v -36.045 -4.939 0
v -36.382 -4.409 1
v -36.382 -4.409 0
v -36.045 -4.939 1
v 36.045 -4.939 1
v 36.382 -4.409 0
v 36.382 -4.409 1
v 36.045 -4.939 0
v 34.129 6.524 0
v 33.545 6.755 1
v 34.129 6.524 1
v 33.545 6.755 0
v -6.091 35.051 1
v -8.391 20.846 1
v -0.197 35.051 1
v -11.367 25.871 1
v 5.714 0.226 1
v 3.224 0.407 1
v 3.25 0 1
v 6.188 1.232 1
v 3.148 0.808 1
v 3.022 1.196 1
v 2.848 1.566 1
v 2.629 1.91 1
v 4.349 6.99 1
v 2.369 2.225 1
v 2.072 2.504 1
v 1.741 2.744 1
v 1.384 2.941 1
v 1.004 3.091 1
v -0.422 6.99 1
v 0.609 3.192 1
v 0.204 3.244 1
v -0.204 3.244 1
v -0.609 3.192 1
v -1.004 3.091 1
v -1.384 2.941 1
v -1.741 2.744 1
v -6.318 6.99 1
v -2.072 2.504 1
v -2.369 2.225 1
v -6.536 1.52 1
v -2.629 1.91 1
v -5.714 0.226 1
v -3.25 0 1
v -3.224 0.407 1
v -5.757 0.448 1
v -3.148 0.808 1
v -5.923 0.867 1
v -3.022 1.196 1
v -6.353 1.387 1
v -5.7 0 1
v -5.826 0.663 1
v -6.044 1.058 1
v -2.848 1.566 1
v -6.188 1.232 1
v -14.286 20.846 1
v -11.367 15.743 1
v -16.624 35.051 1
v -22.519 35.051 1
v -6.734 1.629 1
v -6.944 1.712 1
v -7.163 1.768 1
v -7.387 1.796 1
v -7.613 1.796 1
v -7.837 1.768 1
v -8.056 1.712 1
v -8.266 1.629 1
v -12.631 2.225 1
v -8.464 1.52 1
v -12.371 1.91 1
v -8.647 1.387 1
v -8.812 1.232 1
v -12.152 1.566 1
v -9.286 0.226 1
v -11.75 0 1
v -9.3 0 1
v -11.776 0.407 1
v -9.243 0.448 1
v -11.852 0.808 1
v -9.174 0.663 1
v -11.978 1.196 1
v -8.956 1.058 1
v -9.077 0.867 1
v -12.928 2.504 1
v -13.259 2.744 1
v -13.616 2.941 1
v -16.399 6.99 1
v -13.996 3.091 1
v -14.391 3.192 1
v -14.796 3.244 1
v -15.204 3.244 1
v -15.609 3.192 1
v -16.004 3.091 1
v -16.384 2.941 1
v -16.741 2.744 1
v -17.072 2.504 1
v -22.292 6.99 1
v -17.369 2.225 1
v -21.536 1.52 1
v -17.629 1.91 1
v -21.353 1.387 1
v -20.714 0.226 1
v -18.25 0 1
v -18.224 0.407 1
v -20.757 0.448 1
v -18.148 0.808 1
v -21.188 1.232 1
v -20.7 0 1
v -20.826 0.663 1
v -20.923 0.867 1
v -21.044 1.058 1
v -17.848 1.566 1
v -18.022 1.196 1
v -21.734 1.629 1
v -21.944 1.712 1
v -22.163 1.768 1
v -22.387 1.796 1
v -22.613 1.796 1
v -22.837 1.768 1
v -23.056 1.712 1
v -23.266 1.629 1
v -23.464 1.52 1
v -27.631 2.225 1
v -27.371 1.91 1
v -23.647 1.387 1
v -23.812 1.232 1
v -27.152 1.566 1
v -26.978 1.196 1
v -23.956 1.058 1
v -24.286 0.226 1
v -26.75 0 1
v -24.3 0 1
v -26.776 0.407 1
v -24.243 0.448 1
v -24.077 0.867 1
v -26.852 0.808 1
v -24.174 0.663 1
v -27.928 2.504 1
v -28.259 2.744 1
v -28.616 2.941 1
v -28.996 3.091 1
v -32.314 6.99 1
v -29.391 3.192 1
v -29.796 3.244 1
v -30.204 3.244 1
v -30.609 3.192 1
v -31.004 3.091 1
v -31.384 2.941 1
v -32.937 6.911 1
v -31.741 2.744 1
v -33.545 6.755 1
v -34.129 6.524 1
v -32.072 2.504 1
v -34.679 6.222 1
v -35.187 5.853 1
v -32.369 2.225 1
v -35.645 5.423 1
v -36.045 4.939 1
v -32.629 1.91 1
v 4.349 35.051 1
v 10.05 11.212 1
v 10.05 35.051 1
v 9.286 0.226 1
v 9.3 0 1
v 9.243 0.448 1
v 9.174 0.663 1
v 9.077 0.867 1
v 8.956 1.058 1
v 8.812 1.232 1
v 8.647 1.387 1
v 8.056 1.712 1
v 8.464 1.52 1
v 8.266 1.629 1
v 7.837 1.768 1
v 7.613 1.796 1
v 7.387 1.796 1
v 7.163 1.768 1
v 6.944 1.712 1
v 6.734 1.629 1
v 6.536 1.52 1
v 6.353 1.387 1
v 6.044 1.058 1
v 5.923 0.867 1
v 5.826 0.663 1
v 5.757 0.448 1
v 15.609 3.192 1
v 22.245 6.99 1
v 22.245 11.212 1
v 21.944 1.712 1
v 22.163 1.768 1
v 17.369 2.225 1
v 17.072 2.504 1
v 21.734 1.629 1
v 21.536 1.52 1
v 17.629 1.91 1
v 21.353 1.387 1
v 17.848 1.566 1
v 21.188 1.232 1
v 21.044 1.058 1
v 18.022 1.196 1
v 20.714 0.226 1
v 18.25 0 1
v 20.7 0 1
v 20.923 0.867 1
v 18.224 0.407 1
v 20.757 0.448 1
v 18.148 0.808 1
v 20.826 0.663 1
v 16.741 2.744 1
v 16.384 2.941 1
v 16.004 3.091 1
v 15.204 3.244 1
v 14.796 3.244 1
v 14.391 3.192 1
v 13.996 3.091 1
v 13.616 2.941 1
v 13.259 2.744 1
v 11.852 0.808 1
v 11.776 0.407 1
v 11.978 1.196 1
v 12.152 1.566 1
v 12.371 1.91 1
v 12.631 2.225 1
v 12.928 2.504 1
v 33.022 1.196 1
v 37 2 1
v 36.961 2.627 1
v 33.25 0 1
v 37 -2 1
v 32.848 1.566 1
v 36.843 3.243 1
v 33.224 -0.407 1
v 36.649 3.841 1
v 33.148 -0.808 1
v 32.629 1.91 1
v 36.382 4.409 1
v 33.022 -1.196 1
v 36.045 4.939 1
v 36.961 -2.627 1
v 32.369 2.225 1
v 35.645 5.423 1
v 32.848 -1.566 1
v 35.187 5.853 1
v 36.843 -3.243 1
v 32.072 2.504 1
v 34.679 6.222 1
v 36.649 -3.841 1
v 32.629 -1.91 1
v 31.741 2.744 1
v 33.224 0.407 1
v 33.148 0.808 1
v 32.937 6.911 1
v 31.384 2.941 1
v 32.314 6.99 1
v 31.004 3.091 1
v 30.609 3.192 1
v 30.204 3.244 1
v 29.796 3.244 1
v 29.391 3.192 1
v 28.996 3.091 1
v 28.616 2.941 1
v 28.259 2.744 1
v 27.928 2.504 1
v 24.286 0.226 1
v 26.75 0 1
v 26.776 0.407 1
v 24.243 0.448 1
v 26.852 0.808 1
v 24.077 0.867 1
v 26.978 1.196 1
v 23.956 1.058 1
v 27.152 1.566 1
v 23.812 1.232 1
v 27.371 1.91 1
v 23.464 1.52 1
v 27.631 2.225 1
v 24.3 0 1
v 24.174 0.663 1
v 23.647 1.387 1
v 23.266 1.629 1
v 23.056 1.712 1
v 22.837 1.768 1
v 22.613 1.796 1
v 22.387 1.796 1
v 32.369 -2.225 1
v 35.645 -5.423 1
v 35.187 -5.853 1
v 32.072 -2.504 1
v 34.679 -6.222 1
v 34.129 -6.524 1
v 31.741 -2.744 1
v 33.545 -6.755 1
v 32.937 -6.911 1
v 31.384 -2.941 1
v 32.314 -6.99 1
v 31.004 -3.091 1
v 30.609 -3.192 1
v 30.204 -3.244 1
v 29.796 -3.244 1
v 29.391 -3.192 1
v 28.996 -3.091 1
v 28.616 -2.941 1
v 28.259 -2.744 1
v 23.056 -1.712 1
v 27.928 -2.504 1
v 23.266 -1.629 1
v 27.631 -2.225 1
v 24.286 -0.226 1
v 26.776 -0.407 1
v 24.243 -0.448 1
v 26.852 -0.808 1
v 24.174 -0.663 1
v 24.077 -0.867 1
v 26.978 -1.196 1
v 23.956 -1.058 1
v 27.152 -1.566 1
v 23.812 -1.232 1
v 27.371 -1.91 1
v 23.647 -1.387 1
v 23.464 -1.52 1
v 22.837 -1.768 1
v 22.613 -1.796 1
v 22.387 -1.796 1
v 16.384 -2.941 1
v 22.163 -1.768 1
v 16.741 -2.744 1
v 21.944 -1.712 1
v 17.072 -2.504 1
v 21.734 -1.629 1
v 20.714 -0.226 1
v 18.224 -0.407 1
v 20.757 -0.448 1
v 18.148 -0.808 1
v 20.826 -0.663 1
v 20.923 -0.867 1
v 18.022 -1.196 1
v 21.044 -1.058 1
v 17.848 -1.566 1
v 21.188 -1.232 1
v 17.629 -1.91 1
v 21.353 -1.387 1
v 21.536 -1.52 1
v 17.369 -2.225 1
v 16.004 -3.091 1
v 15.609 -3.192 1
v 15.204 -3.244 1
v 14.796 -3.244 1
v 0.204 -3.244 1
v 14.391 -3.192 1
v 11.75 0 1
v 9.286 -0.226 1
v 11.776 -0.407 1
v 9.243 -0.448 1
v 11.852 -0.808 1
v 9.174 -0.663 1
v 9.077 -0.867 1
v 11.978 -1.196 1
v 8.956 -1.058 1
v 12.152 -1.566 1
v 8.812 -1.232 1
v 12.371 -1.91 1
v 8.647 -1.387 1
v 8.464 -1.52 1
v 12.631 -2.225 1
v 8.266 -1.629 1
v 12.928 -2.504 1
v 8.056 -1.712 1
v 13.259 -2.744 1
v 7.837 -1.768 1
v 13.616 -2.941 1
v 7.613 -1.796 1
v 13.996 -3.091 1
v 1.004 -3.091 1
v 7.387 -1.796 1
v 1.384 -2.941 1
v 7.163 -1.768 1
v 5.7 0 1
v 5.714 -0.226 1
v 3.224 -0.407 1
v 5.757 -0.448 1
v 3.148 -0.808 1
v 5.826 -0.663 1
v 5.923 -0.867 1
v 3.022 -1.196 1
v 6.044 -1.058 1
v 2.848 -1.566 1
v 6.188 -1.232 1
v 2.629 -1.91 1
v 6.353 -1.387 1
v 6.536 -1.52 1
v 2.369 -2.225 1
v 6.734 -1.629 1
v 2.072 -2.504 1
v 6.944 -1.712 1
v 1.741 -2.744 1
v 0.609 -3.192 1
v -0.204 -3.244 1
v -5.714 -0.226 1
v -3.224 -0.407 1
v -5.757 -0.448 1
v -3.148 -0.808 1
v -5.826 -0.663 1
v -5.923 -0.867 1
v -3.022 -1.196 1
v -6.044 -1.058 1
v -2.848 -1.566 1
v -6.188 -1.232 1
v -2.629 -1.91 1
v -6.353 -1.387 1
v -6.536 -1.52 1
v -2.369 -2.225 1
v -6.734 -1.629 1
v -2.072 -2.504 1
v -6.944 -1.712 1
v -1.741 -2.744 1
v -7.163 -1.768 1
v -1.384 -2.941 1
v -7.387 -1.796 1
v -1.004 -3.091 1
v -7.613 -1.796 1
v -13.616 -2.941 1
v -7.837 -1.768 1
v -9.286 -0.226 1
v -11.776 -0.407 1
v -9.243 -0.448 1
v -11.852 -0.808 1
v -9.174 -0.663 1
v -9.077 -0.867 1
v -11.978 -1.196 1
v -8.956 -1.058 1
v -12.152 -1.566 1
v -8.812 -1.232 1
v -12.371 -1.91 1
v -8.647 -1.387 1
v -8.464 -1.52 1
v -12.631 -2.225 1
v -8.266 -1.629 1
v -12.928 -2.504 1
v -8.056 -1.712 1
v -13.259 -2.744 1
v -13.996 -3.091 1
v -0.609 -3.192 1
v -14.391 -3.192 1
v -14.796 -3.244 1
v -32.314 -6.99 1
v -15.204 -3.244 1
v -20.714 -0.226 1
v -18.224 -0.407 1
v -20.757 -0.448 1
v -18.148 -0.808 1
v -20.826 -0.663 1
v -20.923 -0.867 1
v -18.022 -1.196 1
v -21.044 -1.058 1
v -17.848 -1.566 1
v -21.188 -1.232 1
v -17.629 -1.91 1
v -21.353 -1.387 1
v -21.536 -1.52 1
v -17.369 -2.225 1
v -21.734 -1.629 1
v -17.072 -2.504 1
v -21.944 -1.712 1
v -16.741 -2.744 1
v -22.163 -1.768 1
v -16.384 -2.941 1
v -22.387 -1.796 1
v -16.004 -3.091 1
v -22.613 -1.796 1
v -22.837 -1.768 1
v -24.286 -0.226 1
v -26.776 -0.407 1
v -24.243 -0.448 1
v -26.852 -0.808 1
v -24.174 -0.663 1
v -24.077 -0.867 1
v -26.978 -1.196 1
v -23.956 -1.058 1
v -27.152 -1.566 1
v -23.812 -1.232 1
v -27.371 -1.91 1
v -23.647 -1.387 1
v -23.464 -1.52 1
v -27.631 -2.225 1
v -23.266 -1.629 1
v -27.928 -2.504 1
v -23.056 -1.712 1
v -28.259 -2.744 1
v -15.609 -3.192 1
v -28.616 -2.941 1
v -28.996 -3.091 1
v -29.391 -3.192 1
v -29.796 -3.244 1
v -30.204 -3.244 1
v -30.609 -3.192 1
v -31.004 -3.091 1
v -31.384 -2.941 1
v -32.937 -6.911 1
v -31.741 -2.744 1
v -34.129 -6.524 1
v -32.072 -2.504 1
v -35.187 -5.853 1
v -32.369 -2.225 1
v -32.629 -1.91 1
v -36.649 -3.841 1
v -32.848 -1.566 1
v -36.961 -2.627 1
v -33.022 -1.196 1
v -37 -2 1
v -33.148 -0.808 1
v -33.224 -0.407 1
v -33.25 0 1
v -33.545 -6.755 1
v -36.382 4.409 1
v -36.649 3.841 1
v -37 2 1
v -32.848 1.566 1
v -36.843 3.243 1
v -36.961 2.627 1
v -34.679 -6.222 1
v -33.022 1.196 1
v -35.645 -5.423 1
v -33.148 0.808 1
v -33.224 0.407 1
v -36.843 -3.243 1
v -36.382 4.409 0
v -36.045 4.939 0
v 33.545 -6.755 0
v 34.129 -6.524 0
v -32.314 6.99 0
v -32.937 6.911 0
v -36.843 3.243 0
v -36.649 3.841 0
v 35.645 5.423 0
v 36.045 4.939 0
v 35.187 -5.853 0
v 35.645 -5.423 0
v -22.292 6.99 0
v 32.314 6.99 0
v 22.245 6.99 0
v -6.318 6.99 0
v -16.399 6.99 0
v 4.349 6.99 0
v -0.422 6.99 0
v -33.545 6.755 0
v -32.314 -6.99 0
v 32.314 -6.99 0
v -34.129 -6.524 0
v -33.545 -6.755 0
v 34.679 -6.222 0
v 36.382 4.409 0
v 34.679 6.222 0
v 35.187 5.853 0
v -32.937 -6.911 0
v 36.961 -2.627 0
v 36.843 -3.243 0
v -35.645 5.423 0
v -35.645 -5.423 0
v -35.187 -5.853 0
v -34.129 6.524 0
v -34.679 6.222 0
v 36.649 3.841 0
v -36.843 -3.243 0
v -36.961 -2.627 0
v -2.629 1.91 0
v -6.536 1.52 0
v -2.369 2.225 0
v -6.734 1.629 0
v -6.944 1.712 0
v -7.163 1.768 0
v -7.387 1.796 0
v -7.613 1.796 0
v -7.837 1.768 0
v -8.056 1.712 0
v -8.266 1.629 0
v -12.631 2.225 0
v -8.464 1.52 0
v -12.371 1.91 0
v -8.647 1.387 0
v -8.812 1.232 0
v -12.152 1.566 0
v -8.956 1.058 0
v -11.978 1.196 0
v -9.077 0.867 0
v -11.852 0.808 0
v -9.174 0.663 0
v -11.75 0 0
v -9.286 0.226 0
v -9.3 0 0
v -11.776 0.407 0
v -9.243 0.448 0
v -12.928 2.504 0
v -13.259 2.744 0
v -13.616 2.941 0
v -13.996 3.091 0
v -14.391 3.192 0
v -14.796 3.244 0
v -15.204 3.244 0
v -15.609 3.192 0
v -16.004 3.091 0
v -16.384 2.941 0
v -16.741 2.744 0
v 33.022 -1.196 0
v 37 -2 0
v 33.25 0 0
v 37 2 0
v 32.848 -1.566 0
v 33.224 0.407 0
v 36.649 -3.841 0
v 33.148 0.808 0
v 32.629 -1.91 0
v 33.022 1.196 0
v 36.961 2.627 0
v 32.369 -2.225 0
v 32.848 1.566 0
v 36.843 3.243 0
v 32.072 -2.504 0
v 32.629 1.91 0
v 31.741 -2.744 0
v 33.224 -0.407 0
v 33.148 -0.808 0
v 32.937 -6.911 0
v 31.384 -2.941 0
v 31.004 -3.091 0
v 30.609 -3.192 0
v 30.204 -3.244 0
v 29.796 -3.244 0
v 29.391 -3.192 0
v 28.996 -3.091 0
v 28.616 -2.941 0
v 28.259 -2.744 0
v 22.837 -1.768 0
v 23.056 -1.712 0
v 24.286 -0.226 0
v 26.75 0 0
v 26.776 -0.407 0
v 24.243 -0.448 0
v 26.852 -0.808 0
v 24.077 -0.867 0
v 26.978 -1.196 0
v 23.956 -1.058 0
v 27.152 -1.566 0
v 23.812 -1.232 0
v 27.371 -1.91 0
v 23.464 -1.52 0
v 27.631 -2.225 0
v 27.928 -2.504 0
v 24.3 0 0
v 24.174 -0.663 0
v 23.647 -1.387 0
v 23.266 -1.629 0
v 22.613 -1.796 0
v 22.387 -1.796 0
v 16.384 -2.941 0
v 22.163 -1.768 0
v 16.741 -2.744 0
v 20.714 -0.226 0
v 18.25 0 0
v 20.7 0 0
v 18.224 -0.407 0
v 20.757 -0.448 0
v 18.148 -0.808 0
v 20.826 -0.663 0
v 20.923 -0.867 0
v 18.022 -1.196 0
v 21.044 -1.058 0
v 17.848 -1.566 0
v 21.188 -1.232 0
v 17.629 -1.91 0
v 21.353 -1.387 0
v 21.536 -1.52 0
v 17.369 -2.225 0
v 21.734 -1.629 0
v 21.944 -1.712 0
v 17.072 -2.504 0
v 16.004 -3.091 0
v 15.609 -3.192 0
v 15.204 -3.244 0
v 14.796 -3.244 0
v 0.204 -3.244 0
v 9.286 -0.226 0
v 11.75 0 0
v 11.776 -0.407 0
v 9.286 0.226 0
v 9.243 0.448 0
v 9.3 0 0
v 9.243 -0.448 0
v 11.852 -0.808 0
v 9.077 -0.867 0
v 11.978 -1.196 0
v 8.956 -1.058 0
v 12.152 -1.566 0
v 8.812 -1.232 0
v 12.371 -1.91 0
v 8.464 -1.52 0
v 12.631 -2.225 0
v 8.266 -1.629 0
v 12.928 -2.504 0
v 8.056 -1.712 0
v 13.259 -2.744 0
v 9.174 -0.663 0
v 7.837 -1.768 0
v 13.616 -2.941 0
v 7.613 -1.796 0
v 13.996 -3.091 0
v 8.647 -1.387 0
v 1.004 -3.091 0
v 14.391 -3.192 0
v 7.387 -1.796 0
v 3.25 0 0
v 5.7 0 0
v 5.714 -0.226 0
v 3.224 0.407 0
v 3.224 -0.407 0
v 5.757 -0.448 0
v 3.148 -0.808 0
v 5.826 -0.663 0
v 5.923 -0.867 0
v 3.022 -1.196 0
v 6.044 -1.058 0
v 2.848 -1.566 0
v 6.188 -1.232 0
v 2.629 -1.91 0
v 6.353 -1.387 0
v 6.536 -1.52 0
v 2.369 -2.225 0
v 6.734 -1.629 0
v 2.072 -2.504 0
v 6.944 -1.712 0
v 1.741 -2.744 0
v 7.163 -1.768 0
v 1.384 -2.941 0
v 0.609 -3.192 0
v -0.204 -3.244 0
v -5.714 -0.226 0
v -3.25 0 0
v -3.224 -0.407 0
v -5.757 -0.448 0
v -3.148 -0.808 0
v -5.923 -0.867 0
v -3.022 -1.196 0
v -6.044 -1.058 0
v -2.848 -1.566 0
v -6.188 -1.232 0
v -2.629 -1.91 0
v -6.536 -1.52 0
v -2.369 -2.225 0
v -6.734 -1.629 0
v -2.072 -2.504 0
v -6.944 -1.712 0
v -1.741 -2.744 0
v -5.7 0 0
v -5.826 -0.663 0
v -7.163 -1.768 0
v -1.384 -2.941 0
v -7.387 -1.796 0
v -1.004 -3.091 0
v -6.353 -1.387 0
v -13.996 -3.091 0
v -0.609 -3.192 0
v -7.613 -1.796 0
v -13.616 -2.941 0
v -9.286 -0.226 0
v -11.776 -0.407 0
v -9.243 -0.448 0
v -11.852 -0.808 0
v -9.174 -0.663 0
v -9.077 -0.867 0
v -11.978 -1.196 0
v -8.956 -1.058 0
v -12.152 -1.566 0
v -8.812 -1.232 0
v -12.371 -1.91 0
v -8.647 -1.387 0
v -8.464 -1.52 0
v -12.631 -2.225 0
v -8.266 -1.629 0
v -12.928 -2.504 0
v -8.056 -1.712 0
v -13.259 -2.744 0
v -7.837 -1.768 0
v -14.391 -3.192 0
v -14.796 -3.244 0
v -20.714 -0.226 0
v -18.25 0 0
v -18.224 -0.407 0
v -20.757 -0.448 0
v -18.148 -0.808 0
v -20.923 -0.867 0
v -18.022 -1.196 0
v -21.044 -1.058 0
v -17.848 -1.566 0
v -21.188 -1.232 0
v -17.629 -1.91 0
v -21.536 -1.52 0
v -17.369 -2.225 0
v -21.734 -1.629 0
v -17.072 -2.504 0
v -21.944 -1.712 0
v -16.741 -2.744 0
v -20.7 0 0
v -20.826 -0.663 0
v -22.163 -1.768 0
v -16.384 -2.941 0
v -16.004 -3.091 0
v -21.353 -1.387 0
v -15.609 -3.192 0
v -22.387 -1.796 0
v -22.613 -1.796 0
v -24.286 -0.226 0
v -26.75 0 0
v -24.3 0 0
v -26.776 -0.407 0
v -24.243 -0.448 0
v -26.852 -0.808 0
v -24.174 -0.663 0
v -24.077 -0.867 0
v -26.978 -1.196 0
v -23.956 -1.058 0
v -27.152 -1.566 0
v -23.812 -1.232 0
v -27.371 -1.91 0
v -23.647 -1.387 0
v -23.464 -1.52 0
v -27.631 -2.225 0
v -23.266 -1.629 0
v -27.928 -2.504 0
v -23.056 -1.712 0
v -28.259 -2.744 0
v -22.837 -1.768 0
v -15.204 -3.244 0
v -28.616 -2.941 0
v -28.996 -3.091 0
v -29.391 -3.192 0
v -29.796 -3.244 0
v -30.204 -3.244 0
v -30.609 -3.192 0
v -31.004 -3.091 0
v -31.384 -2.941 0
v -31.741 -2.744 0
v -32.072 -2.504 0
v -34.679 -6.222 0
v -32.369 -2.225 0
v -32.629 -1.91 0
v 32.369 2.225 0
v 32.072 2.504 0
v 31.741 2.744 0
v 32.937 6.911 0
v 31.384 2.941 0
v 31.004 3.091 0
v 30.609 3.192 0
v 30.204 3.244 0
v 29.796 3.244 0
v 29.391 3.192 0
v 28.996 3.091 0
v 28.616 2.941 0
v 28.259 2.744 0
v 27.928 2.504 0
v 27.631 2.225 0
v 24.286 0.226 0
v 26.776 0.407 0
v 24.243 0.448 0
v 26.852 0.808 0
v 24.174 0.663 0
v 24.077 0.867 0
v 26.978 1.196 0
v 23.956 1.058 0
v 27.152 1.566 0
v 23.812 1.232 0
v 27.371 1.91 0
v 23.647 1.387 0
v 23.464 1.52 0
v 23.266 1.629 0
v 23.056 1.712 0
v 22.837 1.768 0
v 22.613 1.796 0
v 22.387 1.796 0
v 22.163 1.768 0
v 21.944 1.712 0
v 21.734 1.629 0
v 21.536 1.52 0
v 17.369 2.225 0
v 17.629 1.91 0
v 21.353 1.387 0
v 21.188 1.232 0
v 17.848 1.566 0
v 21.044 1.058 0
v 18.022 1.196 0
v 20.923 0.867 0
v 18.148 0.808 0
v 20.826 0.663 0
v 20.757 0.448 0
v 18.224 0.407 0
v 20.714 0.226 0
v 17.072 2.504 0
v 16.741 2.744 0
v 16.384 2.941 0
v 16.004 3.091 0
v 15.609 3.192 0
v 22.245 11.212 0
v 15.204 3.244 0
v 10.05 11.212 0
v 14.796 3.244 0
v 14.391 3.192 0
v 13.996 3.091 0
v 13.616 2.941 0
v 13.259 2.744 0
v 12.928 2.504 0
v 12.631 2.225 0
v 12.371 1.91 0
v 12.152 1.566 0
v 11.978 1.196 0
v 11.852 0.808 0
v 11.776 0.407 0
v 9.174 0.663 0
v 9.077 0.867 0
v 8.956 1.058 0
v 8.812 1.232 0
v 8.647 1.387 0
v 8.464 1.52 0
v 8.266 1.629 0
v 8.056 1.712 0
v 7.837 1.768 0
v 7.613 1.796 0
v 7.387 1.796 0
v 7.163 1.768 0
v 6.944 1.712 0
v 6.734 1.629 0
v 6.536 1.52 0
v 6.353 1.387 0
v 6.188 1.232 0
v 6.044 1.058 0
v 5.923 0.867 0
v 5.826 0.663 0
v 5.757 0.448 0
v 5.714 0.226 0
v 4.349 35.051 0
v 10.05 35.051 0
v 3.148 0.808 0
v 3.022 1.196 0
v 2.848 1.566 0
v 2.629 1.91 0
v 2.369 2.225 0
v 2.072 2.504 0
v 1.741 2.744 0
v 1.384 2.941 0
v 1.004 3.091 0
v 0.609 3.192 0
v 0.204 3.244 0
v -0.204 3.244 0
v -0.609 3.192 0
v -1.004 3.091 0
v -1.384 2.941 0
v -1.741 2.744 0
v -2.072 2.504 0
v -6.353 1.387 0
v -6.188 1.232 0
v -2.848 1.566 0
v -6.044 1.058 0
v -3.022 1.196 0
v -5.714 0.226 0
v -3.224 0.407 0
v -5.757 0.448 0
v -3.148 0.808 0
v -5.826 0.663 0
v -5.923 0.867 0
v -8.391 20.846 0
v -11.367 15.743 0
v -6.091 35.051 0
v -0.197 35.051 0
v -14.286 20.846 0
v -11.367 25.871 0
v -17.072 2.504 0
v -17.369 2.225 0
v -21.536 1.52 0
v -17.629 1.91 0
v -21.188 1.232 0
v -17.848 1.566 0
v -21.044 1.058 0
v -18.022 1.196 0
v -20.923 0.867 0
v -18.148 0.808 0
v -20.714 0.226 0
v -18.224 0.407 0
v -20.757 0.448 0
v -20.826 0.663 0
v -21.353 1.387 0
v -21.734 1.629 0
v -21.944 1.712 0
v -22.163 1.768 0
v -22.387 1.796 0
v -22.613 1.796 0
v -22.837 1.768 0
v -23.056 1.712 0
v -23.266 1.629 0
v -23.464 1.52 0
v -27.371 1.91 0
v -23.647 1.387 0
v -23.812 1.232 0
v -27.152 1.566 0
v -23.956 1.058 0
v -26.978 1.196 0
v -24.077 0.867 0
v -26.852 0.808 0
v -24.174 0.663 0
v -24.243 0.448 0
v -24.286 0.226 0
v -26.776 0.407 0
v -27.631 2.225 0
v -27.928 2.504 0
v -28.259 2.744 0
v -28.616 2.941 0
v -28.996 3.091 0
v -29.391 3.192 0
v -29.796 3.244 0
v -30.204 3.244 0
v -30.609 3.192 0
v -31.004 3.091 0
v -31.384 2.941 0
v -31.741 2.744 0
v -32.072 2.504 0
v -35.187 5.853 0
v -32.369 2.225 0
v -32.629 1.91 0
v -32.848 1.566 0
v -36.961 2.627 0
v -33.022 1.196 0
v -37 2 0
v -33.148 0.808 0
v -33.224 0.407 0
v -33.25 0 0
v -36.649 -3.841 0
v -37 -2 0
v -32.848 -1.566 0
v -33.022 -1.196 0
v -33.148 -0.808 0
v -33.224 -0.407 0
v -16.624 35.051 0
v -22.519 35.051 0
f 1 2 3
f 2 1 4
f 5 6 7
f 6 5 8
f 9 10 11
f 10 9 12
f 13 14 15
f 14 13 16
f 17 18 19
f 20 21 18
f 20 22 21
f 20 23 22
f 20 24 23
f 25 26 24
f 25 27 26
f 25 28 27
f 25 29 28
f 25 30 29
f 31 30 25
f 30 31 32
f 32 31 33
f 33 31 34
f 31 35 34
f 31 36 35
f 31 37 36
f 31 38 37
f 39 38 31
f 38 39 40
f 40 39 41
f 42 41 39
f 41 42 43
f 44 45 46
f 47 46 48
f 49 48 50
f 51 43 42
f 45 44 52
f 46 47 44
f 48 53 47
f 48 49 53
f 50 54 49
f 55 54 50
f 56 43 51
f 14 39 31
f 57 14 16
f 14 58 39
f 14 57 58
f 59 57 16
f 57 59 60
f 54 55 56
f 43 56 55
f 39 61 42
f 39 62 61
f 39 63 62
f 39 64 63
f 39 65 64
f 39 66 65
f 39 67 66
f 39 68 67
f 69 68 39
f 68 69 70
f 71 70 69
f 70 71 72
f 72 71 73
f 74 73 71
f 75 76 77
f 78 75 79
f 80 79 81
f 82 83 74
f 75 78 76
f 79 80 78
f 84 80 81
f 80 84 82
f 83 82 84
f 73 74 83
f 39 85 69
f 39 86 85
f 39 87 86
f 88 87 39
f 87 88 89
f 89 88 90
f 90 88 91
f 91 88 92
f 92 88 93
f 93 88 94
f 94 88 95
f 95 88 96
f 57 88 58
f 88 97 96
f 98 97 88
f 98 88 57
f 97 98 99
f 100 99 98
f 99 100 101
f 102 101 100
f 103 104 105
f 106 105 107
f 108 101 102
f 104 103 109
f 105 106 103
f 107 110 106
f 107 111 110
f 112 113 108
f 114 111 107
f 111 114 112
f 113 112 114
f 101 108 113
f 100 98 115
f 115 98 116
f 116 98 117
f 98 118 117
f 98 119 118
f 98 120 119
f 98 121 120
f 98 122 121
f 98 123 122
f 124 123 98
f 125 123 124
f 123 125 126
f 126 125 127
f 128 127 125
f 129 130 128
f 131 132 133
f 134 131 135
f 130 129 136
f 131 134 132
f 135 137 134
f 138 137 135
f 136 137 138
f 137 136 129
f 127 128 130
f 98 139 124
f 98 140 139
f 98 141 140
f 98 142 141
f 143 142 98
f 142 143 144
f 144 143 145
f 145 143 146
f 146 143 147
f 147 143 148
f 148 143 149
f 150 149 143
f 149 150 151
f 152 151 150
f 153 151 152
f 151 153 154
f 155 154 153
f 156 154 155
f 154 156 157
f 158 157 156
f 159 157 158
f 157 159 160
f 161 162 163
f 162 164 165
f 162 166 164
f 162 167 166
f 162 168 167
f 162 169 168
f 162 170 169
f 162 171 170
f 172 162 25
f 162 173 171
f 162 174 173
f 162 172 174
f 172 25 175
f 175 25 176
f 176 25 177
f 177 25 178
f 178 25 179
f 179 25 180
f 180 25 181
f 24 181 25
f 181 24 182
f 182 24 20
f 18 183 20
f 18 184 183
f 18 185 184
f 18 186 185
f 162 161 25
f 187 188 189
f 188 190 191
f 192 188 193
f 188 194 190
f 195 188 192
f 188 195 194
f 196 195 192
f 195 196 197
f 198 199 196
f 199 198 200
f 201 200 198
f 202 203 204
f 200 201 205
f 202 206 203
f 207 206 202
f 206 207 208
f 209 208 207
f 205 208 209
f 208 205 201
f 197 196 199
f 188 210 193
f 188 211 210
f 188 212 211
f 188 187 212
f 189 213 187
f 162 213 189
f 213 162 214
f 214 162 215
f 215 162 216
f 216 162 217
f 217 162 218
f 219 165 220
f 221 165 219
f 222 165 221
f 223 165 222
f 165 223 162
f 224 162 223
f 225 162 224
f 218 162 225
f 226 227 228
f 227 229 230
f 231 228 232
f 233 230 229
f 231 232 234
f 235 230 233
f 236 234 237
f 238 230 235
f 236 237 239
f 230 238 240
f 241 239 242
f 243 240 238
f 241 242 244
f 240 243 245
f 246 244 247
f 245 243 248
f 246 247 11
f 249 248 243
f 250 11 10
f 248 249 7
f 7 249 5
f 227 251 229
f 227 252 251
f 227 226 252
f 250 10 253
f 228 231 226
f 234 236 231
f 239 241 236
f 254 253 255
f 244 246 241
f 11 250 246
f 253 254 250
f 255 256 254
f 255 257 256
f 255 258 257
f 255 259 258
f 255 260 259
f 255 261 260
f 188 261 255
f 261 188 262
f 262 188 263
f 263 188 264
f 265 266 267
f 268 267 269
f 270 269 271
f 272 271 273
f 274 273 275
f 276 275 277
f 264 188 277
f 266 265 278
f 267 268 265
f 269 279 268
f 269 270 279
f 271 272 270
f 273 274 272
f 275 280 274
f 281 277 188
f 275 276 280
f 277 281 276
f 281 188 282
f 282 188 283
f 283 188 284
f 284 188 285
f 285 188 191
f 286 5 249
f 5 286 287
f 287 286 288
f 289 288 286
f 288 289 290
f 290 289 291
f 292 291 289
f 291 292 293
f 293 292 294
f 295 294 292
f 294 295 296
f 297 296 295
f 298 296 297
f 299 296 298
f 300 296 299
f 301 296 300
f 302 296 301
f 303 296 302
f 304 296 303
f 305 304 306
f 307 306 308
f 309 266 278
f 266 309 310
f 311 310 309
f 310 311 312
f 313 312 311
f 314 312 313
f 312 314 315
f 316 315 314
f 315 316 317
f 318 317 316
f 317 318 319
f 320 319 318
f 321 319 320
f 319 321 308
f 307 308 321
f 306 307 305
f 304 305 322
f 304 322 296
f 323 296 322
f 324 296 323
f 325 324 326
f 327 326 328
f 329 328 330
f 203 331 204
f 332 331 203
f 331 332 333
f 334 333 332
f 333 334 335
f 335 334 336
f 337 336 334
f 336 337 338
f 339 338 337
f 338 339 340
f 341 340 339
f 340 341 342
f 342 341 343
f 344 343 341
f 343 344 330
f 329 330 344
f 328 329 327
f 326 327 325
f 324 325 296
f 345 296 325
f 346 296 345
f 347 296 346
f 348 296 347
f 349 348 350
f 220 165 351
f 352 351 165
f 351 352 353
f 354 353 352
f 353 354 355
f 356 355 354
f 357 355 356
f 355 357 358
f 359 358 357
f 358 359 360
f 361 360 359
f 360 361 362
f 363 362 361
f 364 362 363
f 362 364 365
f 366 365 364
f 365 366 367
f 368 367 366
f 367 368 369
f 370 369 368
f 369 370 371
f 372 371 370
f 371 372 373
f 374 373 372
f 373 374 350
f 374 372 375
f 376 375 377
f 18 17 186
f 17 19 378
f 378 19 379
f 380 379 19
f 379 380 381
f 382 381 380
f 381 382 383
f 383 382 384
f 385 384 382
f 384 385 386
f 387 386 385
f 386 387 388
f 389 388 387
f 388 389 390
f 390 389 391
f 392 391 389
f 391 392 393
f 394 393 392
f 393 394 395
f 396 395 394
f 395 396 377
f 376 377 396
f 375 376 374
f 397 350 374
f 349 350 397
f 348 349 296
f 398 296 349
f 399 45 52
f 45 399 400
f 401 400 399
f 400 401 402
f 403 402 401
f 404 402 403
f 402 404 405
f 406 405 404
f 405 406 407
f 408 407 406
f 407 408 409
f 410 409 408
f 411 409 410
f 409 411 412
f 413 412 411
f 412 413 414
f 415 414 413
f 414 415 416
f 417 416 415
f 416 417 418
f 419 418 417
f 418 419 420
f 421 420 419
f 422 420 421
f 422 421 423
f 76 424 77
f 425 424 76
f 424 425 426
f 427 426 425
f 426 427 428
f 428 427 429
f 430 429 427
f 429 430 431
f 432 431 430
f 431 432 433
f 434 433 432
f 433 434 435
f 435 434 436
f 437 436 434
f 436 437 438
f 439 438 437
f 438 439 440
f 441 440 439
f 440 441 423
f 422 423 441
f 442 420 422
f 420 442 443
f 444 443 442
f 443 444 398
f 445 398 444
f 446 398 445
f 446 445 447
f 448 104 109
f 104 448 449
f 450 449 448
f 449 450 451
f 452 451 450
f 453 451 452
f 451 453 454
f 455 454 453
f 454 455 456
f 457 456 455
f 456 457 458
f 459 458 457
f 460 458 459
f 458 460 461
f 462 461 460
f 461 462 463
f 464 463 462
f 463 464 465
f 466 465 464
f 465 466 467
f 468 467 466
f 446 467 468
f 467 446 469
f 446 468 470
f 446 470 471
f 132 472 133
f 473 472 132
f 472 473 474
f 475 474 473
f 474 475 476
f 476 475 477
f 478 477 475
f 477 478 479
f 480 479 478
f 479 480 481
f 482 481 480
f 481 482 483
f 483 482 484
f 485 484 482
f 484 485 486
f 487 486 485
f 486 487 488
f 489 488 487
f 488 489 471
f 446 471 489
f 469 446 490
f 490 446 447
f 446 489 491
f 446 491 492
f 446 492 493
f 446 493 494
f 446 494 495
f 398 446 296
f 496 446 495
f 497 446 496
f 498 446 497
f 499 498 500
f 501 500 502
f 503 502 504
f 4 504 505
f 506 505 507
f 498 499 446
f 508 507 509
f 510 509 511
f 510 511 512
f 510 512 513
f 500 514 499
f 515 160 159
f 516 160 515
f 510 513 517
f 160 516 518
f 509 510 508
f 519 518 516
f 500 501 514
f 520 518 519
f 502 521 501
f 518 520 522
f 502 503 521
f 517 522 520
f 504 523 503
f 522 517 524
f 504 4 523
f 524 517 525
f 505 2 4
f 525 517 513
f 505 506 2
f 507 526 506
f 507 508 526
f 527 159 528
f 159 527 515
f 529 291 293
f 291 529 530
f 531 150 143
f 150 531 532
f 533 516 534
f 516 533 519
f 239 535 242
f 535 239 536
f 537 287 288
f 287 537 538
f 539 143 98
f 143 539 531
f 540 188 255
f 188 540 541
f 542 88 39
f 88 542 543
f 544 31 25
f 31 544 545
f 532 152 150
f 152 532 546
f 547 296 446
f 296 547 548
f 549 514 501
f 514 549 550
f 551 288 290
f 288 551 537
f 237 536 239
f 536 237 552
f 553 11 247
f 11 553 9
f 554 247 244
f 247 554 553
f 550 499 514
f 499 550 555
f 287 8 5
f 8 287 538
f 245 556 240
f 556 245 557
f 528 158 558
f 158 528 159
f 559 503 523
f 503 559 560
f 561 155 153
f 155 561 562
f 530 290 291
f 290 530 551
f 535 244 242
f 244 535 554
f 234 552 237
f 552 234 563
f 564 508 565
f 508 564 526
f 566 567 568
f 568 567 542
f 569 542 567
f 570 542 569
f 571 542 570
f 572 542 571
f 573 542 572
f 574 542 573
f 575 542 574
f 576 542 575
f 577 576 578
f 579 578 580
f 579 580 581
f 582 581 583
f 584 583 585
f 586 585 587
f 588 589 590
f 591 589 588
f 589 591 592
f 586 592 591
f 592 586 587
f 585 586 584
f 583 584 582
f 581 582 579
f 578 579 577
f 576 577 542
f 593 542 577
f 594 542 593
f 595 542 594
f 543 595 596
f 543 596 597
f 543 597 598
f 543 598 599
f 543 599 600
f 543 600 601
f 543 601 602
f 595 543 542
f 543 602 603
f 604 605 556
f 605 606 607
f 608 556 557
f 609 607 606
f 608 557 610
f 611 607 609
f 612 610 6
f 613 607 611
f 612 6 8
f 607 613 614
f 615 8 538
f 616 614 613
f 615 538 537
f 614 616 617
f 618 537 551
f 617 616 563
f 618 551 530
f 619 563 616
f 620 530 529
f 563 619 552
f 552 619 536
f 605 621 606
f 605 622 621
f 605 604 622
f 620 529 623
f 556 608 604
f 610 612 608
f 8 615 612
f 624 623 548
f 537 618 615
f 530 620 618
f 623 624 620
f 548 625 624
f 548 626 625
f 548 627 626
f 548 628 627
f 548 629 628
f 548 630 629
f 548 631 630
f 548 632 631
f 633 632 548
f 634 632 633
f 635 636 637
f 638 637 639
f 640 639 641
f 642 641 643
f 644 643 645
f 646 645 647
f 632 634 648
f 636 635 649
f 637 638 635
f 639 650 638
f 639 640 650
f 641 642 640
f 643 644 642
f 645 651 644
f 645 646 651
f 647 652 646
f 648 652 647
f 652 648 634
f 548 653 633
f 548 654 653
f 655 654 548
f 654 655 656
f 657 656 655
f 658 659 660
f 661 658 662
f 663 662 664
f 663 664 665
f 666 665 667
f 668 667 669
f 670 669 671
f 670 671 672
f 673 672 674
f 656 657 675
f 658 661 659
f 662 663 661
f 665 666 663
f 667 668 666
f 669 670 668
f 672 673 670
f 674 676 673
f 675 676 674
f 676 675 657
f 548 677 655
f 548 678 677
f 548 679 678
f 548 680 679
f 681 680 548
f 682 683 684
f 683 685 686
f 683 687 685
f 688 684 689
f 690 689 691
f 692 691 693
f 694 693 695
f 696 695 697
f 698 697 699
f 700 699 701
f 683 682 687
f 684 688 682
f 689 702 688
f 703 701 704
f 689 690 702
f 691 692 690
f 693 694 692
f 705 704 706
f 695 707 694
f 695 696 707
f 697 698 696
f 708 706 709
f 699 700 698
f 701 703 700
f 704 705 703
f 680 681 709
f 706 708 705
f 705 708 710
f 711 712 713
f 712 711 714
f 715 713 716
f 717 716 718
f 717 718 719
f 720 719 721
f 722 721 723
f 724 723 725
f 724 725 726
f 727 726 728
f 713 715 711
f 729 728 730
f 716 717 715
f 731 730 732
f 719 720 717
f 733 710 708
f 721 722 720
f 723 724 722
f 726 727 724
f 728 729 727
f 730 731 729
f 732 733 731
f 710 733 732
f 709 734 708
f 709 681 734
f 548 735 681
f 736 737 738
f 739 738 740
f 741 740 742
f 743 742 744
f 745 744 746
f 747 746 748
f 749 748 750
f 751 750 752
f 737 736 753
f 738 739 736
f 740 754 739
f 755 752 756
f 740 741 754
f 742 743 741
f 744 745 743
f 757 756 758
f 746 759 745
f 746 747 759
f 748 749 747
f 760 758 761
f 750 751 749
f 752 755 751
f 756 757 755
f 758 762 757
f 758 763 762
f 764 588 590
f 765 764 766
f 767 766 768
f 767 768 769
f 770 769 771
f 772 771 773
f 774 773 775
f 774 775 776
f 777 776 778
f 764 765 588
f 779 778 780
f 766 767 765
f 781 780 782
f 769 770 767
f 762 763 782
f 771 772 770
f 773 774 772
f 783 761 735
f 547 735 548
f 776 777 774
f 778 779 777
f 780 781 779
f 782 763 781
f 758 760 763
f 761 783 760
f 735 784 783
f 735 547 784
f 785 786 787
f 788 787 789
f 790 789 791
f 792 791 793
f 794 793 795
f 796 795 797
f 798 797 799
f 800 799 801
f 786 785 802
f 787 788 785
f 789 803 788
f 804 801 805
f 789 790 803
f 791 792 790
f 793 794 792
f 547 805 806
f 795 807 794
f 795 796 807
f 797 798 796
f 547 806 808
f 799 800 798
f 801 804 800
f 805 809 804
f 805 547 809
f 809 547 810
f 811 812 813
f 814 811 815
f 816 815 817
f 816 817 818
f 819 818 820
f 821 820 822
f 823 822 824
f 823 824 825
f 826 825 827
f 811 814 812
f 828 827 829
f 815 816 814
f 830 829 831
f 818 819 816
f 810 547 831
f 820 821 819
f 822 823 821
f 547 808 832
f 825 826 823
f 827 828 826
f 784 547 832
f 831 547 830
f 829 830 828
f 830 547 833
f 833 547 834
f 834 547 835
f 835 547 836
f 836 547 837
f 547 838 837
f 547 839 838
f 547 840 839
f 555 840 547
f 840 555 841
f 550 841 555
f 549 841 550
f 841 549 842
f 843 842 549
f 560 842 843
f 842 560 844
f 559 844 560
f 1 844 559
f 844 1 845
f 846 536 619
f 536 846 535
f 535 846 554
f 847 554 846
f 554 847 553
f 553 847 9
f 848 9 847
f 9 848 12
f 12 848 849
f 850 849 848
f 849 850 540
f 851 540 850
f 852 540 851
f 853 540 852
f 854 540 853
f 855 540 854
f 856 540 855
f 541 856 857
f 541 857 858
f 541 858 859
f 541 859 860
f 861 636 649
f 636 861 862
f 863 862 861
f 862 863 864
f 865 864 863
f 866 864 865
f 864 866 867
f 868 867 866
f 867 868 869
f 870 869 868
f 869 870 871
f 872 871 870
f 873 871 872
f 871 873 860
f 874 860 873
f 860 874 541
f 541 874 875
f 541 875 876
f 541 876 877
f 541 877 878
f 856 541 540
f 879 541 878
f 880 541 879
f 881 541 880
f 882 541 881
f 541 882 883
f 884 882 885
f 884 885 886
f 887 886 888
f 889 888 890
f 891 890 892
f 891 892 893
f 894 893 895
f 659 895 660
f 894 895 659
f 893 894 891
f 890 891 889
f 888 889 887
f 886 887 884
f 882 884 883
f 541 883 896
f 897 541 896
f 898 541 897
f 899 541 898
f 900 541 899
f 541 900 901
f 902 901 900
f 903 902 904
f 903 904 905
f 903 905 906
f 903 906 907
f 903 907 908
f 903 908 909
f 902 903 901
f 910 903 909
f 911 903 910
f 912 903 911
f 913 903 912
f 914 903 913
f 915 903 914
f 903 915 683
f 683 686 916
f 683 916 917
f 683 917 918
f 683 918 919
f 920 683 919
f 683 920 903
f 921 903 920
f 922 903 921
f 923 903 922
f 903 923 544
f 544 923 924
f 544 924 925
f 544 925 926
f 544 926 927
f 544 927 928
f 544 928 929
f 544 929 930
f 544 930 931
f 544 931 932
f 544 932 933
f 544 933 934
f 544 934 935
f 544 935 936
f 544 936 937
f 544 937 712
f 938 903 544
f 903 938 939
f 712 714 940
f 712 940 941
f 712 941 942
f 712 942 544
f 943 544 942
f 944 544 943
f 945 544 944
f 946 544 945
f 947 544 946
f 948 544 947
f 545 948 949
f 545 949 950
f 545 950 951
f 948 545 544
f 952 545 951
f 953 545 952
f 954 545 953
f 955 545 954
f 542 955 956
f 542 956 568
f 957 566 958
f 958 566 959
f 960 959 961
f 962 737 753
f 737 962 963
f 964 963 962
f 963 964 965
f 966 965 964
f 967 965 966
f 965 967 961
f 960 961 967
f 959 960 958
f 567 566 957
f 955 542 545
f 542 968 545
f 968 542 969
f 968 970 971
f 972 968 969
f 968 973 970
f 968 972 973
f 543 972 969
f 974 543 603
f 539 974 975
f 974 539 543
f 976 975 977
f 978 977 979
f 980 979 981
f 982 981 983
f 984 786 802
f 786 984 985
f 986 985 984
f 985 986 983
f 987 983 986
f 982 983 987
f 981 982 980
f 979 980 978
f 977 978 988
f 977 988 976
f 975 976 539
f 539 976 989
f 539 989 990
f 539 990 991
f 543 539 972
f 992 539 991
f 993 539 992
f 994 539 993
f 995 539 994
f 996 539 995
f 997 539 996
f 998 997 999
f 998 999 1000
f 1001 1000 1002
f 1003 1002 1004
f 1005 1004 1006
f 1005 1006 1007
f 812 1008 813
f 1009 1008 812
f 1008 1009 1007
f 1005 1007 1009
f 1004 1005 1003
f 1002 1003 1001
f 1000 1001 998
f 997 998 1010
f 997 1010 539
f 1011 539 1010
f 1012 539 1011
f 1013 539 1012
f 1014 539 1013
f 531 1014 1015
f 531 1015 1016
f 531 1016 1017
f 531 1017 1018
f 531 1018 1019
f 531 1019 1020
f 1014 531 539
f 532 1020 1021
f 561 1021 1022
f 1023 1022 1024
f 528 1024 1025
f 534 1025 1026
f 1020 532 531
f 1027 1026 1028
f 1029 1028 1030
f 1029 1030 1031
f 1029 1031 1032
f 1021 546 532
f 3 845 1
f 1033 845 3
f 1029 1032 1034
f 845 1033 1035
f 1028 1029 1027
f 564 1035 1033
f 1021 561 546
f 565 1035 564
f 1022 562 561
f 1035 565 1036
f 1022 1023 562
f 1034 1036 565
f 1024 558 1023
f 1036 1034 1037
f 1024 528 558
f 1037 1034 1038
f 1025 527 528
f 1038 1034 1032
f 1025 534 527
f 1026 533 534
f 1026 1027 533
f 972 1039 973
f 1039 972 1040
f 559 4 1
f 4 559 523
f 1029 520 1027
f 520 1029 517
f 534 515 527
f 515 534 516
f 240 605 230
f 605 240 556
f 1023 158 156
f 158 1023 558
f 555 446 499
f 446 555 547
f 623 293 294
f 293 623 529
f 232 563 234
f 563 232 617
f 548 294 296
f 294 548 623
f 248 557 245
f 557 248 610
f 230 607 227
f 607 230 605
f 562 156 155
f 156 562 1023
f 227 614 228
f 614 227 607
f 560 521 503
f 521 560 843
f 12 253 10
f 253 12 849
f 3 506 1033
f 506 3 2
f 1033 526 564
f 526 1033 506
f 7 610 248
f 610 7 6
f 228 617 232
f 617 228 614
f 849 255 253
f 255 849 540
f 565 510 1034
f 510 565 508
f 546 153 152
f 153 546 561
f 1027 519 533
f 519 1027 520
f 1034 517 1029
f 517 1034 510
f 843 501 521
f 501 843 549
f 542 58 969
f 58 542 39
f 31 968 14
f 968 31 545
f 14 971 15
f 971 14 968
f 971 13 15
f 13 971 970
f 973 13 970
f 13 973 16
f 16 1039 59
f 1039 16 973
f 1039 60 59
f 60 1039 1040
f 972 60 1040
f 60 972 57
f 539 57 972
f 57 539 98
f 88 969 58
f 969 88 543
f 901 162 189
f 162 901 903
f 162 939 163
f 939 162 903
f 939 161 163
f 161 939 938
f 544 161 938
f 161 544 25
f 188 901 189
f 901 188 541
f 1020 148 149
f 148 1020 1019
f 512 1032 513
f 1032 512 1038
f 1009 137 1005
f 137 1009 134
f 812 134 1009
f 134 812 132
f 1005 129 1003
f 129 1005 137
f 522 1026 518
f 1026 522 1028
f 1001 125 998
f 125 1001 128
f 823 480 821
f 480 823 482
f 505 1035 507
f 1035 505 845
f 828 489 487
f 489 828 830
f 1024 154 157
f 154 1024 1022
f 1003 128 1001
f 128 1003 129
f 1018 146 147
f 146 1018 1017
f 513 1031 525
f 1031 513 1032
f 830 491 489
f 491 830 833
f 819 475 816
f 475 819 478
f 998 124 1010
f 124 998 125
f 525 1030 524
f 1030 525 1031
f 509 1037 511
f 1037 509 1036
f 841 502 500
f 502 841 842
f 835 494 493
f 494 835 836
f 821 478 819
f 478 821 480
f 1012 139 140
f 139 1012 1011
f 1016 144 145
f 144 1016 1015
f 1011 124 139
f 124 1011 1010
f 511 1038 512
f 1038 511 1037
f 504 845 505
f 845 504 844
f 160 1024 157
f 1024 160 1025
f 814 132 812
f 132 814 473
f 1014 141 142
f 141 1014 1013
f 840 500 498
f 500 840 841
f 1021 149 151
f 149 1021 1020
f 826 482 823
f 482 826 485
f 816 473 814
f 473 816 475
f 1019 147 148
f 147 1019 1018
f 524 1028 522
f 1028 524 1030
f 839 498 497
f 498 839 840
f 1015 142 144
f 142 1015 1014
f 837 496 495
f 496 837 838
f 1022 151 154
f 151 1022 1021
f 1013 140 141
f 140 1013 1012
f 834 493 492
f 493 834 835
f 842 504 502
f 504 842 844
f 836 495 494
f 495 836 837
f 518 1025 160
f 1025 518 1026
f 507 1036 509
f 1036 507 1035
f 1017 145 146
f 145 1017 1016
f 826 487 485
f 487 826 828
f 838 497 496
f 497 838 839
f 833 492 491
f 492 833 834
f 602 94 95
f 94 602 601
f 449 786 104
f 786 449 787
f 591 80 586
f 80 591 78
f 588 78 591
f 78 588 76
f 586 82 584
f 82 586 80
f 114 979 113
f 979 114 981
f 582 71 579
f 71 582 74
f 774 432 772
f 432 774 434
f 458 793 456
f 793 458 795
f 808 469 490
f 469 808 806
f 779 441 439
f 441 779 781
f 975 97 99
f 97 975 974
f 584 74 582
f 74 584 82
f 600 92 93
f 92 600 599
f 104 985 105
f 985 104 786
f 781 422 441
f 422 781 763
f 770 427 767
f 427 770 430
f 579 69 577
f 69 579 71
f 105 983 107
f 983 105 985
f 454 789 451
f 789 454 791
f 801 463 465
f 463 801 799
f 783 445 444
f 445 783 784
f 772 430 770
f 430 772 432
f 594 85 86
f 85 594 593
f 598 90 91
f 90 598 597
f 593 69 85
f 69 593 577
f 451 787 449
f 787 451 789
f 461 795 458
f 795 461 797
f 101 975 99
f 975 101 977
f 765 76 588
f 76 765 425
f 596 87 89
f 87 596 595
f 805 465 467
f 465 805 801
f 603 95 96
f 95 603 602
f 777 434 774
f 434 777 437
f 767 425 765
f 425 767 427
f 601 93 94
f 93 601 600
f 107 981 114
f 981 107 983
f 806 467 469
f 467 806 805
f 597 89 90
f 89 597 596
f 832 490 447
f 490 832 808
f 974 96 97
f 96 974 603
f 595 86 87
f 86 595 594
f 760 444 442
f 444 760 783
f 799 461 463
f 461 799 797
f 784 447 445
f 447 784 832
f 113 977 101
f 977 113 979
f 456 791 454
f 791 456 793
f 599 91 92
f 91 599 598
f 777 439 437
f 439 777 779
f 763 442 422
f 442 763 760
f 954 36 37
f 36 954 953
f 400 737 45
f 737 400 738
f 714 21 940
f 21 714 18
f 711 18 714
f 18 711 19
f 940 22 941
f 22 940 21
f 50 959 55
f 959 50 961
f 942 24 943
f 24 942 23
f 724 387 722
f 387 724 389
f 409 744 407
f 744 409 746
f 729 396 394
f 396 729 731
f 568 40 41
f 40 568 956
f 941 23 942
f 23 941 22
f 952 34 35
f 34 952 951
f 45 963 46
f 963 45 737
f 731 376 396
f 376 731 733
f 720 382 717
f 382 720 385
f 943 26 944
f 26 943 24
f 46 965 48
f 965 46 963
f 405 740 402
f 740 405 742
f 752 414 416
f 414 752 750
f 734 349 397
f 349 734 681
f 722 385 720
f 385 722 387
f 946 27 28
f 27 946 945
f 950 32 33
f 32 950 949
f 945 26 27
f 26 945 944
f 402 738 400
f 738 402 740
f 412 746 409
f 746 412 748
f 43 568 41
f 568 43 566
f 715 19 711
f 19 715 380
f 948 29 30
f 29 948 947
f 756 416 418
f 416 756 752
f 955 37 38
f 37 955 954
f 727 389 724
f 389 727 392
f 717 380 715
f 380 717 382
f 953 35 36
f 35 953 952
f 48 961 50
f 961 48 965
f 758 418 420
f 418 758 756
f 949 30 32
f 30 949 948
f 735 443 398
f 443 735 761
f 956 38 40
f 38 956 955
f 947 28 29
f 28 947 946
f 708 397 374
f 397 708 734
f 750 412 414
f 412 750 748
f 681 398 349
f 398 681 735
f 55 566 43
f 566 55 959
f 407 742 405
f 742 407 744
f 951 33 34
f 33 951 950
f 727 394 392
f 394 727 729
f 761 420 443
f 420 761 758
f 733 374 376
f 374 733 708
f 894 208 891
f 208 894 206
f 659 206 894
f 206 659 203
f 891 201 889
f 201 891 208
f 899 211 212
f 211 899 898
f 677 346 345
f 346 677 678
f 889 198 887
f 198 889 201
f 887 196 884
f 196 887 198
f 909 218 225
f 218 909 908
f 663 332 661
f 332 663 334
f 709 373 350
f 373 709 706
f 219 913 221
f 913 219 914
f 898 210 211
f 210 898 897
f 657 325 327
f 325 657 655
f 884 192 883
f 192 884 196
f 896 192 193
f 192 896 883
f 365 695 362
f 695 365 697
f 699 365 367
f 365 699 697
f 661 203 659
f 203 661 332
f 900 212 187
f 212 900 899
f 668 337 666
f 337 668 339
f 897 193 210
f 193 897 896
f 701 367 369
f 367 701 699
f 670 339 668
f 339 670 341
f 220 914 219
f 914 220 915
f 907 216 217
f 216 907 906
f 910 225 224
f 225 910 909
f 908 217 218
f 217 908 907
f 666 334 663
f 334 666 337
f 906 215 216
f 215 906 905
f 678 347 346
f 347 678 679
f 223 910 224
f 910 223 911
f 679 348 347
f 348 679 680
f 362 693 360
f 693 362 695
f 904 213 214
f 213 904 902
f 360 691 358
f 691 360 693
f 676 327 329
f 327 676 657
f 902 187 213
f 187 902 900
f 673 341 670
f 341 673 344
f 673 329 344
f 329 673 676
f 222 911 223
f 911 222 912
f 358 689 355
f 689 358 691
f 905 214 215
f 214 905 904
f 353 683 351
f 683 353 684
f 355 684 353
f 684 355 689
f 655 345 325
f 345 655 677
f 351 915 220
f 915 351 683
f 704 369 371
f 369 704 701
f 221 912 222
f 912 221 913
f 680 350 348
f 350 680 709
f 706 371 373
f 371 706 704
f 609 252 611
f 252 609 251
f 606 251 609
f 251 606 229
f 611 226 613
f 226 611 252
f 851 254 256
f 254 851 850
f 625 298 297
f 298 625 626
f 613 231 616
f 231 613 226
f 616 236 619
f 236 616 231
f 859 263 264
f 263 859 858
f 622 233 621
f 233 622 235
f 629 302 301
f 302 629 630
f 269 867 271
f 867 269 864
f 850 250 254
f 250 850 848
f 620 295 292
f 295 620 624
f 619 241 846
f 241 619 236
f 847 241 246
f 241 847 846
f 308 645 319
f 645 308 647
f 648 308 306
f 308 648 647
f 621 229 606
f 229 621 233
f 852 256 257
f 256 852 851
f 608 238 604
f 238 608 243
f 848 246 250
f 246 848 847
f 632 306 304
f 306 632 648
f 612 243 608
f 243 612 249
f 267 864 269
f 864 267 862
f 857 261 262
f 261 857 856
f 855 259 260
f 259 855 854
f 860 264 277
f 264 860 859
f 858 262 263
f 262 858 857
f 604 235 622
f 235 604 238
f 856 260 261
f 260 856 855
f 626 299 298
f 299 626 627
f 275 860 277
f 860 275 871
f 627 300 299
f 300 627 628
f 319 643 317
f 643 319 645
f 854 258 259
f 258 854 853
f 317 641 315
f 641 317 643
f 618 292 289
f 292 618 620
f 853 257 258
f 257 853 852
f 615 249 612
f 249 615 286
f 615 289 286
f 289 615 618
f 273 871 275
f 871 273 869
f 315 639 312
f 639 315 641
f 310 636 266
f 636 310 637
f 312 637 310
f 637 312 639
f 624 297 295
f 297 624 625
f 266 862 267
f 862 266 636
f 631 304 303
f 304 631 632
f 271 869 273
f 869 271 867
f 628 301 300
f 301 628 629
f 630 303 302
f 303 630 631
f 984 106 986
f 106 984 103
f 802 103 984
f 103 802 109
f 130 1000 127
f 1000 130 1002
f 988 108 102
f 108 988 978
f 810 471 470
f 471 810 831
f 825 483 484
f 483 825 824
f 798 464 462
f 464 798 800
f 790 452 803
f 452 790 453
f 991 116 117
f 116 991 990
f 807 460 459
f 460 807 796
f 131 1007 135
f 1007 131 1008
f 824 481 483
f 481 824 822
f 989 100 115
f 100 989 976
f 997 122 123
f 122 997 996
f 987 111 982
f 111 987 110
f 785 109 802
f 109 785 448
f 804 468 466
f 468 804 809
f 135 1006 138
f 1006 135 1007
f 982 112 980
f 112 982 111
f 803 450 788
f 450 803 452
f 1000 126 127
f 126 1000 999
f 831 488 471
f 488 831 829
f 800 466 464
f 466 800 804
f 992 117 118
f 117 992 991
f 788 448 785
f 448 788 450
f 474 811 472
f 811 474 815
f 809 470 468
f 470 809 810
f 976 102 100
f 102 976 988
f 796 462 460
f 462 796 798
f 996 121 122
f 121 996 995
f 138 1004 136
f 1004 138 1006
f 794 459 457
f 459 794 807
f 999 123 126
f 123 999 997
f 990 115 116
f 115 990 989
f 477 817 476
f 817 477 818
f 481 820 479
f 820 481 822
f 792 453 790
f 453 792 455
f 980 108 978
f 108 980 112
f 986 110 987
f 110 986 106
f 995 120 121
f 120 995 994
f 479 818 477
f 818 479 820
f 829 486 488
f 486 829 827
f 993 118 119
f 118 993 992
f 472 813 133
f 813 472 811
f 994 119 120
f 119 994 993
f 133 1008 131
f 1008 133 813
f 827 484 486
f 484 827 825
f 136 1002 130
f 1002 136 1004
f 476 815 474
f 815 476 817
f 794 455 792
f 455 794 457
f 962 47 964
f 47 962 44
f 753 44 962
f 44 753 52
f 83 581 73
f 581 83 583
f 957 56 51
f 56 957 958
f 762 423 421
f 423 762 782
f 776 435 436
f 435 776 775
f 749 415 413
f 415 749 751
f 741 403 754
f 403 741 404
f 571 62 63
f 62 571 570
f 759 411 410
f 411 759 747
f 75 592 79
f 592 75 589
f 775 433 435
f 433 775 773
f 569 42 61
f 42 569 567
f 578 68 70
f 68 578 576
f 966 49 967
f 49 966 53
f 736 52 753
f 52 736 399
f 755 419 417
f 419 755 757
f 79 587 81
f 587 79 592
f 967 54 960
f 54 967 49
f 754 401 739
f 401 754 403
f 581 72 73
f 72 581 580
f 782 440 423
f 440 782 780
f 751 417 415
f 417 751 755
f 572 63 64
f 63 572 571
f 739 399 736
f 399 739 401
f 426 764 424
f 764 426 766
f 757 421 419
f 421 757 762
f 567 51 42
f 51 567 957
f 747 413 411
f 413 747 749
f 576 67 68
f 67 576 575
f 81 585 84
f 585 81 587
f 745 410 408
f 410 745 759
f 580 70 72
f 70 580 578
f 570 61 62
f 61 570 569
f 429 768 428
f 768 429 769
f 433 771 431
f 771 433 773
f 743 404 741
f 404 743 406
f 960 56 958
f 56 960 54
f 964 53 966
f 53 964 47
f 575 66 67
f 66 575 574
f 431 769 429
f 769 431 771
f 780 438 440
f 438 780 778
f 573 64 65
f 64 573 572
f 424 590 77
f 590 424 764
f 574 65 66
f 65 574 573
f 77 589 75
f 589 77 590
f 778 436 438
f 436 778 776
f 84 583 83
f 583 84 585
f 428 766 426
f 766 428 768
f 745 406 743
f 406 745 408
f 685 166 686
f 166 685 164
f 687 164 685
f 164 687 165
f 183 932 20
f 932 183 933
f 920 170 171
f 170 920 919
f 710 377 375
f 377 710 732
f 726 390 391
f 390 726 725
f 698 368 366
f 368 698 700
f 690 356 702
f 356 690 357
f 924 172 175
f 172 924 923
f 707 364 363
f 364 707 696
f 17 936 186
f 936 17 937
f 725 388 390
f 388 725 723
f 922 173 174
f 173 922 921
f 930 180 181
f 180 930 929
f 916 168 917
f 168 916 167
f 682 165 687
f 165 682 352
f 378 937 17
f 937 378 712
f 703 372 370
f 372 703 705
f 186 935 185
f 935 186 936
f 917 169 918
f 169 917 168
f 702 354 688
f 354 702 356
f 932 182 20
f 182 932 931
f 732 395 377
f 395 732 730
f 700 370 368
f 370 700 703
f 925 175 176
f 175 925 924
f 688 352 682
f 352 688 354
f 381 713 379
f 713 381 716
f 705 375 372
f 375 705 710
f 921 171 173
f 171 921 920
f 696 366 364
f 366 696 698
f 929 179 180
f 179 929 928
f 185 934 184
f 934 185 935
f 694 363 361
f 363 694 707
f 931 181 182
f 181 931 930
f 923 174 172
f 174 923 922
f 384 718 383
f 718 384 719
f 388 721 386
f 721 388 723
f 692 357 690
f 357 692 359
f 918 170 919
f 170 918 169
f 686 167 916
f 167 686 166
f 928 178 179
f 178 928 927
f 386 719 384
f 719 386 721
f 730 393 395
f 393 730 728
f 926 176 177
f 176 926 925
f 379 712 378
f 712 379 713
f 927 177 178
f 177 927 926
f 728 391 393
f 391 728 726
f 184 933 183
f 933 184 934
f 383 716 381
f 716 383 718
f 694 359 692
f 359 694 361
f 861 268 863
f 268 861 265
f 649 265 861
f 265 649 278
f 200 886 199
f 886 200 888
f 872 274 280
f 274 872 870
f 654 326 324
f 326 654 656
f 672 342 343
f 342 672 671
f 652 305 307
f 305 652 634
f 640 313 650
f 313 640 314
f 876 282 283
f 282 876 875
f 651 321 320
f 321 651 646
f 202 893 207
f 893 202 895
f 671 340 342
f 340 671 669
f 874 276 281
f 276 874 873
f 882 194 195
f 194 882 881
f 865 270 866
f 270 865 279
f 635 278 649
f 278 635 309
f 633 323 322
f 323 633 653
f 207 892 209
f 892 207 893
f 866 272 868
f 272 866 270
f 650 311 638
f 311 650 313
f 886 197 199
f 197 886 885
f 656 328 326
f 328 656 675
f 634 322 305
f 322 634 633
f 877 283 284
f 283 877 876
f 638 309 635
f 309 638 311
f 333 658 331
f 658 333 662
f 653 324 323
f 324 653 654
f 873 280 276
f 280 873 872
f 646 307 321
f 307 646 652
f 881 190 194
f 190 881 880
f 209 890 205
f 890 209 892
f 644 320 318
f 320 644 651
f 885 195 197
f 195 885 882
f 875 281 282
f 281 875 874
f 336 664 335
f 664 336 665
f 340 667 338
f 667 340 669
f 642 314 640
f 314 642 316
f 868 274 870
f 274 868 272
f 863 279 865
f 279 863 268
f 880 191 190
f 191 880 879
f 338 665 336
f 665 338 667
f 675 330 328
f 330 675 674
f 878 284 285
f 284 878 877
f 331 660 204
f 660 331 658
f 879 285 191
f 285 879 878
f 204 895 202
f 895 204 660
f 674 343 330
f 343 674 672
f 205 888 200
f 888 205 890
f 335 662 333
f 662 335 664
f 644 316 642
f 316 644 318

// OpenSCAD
$fn = 50;


difference() {
	union() {
		hull() {
			translate(v = [-32.0000000000, 2.0000000000, 0]) {
				cylinder(h = 1, r = 5);
			}
			translate(v = [32.0000000000, 2.0000000000, 0]) {
				cylinder(h = 1, r = 5);
			}
			translate(v = [-32.0000000000, -2.0000000000, 0]) {
				cylinder(h = 1, r = 5);
			}
			translate(v = [32.0000000000, -2.0000000000, 0]) {
				cylinder(h = 1, r = 5);
			}
		}
		translate(v = [0, 34.3750000000, 0]) {
			linear_extrude(height = 1) {
				text(font = "DejaVu Sans Mono:style=Bold", halign = "center", size = 28.5000000000, text = "XL", valign = "top");
			}
		}
	}
	union() {
		translate(v = [-30.0000000000, 0.0000000000, 0]) {
			translate(v = [0, 0, -100]) {
				cylinder(h = 200, r = 3.2500000000);
			}
		}
		translate(v = [-15.0000000000, 0.0000000000, 0]) {
			translate(v = [0, 0, -100]) {
				cylinder(h = 200, r = 3.2500000000);
			}
		}
		translate(v = [0, 0, -100]) {
			cylinder(h = 200, r = 3.2500000000);
		}
		translate(v = [15.0000000000, 0.0000000000, 0]) {
			translate(v = [0, 0, -100]) {
				cylinder(h = 200, r = 3.2500000000);
			}
		}
		translate(v = [30.0000000000, 0.0000000000, 0]) {
			translate(v = [0, 0, -100]) {
				cylinder(h = 200, r = 3.2500000000);
			}
		}
		translate(v = [-30.0000000000, 0.0000000000, 0]) {
			translate(v = [0, 0, -100]) {
				cylinder(h = 200, r = 1.8000000000);
			}
		}
		translate(v = [-22.5000000000, 0.0000000000, 0]) {
			translate(v = [0, 0, -100]) {
				cylinder(h = 200, r = 1.8000000000);
			}
		}
		translate(v = [-15.0000000000, 0.0000000000, 0]) {
			translate(v = [0, 0, -100]) {
				cylinder(h = 200, r = 1.8000000000);
			}
		}
		translate(v = [-7.5000000000, 0.0000000000, 0]) {
			translate(v = [0, 0, -100]) {
				cylinder(h = 200, r = 1.8000000000);
			}
		}
		translate(v = [0, 0, -100]) {
			cylinder(h = 200, r = 1.8000000000);
		}
		translate(v = [7.5000000000, 0.0000000000, 0]) {
			translate(v = [0, 0, -100]) {
				cylinder(h = 200, r = 1.8000000000);
			}
		}
		translate(v = [15.0000000000, 0.0000000000, 0]) {
			translate(v = [0, 0, -100]) {
				cylinder(h = 200, r = 1.8000000000);
			}
		}
		translate(v = [22.5000000000, 0.0000000000, 0]) {
			translate(v = [0, 0, -100]) {
				cylinder(h = 200, r = 1.8000000000);
			}
		}
		translate(v = [30.0000000000, 0.0000000000, 0]) {
			translate(v = [0, 0, -100]) {
				cylinder(h = 200, r = 1.8000000000);
			}
		}
	}
}
